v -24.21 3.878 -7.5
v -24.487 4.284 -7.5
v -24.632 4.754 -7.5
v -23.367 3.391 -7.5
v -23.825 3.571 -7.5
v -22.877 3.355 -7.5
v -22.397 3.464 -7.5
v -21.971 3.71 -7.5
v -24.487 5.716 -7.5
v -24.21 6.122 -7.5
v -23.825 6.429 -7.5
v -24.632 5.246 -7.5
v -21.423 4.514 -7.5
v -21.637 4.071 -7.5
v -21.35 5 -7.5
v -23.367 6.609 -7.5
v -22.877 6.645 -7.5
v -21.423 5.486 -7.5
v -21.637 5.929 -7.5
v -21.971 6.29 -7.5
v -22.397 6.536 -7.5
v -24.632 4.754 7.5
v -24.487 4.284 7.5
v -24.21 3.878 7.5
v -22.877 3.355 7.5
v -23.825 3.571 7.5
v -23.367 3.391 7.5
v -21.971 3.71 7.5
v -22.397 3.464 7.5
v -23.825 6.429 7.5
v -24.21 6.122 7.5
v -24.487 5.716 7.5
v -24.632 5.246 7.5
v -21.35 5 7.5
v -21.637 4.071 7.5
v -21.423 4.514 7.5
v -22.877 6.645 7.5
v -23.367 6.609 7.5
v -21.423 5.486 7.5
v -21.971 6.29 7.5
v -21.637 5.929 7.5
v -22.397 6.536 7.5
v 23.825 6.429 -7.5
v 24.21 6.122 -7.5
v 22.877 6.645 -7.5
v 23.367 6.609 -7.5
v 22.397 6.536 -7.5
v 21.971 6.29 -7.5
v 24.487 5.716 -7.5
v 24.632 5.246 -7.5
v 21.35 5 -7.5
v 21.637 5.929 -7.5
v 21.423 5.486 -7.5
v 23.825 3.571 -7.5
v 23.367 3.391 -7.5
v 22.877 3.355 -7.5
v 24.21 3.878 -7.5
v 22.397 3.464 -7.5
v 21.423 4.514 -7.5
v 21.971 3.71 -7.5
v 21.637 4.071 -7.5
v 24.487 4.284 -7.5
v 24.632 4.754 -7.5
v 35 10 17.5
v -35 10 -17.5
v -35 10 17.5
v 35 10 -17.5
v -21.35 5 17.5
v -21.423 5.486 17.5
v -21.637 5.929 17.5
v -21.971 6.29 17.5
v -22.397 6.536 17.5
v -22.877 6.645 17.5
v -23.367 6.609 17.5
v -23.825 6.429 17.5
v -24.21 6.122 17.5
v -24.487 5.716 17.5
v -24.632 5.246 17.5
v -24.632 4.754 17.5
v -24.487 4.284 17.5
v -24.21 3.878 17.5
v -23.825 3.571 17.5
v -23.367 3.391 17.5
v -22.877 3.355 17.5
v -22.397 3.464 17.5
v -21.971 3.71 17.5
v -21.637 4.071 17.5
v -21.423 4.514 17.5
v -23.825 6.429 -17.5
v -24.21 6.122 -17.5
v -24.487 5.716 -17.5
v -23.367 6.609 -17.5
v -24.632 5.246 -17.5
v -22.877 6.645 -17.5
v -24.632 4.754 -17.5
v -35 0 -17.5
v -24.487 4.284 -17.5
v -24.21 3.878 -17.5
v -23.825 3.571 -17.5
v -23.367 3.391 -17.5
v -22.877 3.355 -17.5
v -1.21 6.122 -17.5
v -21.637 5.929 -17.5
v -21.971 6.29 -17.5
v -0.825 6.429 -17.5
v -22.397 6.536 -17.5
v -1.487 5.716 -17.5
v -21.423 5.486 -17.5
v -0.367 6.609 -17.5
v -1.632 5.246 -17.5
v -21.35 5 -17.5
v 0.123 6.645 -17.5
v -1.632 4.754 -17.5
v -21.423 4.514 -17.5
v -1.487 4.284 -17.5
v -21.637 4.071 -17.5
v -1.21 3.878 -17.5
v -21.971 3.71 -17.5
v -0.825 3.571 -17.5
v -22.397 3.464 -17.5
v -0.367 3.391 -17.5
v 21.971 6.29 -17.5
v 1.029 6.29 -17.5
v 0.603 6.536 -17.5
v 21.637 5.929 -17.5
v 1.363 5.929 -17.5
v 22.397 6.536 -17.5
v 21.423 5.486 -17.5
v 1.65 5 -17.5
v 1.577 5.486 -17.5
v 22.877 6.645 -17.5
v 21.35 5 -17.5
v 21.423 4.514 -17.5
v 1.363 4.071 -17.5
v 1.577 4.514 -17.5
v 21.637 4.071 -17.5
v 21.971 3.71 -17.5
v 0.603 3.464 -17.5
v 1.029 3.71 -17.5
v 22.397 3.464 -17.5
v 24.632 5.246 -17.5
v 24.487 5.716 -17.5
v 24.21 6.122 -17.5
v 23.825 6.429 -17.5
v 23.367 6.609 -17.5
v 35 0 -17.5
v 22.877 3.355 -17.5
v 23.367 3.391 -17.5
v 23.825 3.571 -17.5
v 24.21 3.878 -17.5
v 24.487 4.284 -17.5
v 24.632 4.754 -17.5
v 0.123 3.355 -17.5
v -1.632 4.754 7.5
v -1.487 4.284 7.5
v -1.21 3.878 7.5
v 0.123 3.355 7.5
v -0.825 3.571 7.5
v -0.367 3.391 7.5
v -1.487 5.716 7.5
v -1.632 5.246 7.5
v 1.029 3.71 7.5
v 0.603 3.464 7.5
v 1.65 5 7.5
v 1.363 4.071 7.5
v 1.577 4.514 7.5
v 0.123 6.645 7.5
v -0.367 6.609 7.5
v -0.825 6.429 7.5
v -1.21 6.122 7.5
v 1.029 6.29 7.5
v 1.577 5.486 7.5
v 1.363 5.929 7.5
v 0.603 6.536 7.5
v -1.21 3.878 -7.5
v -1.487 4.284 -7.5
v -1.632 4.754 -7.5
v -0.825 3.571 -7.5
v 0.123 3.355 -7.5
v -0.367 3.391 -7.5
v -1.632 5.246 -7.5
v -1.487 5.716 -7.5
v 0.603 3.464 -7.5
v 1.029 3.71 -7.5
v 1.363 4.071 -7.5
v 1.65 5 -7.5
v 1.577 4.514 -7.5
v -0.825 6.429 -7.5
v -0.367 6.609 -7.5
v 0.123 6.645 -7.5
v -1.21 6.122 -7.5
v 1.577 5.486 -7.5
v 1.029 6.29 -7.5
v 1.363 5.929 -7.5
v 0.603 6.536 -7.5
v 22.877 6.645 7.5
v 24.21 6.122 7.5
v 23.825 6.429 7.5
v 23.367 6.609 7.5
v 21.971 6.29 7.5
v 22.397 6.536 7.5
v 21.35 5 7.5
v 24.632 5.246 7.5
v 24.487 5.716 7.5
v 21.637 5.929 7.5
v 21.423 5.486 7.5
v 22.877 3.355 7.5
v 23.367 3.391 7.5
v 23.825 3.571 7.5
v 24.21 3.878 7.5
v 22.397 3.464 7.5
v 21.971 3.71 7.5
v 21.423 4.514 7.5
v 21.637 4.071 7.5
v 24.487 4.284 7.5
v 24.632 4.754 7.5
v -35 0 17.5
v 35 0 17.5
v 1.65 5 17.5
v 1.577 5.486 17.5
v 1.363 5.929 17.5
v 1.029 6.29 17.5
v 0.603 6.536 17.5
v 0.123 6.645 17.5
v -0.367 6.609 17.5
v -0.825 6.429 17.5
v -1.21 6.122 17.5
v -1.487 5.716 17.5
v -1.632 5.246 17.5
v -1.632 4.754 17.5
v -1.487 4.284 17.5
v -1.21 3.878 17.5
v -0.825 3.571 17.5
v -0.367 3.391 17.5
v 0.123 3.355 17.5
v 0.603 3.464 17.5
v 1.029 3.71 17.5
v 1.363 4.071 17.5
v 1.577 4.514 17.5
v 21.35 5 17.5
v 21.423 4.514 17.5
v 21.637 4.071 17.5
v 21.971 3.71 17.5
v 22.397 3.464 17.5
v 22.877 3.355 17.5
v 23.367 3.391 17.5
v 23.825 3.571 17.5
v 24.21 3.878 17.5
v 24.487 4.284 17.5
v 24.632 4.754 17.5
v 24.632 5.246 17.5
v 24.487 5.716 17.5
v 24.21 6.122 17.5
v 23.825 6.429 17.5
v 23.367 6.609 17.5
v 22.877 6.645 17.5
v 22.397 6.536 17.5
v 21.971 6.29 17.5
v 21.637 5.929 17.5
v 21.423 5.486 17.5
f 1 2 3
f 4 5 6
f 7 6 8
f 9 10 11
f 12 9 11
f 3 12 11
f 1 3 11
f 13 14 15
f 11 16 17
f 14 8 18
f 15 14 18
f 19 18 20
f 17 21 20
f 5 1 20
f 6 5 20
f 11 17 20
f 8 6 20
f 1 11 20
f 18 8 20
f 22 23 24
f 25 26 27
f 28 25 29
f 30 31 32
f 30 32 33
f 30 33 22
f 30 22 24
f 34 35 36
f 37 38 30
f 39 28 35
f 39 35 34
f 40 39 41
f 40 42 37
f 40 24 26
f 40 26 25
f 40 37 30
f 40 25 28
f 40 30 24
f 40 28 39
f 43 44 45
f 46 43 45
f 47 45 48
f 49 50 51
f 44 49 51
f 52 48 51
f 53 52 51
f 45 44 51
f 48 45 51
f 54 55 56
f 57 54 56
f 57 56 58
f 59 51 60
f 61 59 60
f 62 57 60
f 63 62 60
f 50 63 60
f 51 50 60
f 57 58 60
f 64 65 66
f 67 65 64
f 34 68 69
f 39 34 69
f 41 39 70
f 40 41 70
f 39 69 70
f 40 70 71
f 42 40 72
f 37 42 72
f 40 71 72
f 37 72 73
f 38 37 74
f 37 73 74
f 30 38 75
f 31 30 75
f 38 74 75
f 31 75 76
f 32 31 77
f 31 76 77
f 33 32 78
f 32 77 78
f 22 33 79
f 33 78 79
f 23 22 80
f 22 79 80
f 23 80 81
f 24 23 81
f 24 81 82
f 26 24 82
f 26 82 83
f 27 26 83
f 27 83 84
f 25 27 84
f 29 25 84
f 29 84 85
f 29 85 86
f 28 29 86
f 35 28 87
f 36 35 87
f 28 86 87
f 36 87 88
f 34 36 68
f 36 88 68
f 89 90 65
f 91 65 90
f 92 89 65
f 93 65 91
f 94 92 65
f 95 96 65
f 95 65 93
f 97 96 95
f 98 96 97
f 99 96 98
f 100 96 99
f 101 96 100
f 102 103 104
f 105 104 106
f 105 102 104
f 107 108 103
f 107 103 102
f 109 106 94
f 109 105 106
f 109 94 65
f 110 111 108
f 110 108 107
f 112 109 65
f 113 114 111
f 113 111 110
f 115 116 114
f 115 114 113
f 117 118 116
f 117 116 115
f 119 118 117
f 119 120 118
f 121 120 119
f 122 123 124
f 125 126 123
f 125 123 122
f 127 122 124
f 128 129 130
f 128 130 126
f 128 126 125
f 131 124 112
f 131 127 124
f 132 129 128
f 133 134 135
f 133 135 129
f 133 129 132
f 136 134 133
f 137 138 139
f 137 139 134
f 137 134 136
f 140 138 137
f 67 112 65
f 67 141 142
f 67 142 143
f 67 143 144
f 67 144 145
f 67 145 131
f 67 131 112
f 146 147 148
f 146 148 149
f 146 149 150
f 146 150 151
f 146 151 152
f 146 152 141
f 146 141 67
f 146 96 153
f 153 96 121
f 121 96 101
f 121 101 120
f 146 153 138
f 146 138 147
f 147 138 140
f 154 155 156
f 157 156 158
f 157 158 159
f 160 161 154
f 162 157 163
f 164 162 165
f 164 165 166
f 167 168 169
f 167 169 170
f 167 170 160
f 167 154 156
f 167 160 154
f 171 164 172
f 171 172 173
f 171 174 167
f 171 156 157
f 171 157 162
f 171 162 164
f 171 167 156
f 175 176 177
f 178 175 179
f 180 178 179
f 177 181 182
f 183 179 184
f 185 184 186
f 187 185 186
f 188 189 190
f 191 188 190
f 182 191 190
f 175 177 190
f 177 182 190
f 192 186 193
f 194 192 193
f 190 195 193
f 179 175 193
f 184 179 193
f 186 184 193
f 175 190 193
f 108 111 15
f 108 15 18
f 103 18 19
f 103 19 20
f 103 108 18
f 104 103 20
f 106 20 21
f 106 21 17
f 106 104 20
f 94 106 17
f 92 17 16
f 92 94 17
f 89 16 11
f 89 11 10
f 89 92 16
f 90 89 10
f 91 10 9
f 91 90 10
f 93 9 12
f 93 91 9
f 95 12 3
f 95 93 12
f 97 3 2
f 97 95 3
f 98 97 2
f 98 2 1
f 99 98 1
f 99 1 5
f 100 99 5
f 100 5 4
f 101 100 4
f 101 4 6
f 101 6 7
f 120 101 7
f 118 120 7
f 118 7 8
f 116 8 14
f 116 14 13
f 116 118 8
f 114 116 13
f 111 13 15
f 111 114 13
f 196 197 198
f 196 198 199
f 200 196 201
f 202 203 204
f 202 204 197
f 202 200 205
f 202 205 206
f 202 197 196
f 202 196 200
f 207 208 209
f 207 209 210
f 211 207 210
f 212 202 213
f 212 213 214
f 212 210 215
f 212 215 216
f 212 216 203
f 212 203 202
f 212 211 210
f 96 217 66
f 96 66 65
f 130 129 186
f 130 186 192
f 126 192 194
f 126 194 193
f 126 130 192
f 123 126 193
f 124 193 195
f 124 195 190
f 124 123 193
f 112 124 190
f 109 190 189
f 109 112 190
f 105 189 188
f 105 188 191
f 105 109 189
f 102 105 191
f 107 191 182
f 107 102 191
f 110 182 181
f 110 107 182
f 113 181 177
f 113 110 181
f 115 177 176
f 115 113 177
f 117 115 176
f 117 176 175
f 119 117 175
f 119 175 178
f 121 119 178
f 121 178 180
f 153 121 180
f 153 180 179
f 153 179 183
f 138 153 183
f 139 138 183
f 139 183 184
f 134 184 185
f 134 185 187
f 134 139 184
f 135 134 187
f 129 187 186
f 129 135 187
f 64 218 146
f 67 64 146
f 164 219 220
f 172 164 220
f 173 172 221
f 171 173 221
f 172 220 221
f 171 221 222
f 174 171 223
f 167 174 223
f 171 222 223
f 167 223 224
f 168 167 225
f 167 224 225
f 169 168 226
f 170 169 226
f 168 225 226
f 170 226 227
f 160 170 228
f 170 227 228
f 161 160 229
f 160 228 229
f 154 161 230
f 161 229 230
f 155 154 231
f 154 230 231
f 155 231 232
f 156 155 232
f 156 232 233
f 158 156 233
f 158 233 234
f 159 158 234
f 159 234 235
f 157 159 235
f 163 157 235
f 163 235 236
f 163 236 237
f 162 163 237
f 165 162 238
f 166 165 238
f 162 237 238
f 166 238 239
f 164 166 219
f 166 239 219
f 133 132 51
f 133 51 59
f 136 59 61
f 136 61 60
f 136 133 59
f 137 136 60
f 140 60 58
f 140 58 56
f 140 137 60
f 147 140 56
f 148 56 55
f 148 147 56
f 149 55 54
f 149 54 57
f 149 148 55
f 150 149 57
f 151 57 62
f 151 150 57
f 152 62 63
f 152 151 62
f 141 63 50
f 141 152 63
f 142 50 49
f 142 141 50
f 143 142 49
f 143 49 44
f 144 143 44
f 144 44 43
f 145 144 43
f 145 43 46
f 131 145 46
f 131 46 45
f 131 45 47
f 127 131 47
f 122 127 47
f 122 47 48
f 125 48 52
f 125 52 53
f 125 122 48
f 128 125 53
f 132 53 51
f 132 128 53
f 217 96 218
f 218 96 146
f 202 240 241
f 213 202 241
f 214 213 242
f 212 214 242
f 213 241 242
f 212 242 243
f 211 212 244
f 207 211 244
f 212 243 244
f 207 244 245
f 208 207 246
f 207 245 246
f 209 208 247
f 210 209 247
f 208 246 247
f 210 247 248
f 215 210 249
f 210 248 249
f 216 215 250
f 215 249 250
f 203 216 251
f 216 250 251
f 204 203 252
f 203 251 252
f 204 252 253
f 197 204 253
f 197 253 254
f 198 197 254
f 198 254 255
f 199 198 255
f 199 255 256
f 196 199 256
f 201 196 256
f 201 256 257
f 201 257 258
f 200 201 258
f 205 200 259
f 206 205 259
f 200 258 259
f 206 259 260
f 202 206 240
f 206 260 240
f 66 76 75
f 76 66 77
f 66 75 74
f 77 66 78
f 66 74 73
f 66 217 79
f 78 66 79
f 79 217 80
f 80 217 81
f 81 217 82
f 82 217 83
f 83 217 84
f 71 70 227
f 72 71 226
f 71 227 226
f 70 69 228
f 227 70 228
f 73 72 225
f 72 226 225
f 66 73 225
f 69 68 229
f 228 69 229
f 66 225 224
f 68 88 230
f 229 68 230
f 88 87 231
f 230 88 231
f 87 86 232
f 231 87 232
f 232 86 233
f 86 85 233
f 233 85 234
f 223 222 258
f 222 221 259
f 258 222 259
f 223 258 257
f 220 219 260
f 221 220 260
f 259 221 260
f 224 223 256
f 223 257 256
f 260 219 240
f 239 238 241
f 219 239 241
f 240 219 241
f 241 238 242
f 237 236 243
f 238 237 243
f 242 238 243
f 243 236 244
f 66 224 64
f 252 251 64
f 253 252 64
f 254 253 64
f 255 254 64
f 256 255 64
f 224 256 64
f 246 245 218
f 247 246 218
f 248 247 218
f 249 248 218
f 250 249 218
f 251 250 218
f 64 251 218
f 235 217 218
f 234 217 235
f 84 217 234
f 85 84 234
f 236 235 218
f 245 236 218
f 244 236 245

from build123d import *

# Parameters (mm, degrees)
SKETCH1_W           = 70
SKETCH1_H           = 35
BOSS_EXTRUDE1_DEPTH = 10
SKETCH2_R           = 1.65
CUT_EXTRUDE1_DEPTH  = 10


with BuildPart() as part:
    # Sketch1 → Boss-Extrude1 (new body)
    with BuildSketch(Plane(origin=(0, 0, 0), x_dir=(1, 0, 0), z_dir=(0, 1, 0))):
        Rectangle(SKETCH1_W, SKETCH1_H)
    extrude(amount=BOSS_EXTRUDE1_DEPTH)

    # Sketch2 → Cut-Extrude1 (cut)
    with BuildSketch(Plane.XY.offset(17.5)):
        with Locations((0, 5)):
            Circle(SKETCH2_R)
        with Locations((-23, 5)):
            Circle(SKETCH2_R)
        with Locations(Location((23, 5, 0), (0, 0, 180))):
            Circle(SKETCH2_R)
    cut_extrude1 = extrude(amount=-CUT_EXTRUDE1_DEPTH, mode=Mode.SUBTRACT)

    # Mirror1: Cut-Extrude1 across plane
    add(cut_extrude1.mirror(Plane.XY), mode=Mode.SUBTRACT)


solid = part.part
